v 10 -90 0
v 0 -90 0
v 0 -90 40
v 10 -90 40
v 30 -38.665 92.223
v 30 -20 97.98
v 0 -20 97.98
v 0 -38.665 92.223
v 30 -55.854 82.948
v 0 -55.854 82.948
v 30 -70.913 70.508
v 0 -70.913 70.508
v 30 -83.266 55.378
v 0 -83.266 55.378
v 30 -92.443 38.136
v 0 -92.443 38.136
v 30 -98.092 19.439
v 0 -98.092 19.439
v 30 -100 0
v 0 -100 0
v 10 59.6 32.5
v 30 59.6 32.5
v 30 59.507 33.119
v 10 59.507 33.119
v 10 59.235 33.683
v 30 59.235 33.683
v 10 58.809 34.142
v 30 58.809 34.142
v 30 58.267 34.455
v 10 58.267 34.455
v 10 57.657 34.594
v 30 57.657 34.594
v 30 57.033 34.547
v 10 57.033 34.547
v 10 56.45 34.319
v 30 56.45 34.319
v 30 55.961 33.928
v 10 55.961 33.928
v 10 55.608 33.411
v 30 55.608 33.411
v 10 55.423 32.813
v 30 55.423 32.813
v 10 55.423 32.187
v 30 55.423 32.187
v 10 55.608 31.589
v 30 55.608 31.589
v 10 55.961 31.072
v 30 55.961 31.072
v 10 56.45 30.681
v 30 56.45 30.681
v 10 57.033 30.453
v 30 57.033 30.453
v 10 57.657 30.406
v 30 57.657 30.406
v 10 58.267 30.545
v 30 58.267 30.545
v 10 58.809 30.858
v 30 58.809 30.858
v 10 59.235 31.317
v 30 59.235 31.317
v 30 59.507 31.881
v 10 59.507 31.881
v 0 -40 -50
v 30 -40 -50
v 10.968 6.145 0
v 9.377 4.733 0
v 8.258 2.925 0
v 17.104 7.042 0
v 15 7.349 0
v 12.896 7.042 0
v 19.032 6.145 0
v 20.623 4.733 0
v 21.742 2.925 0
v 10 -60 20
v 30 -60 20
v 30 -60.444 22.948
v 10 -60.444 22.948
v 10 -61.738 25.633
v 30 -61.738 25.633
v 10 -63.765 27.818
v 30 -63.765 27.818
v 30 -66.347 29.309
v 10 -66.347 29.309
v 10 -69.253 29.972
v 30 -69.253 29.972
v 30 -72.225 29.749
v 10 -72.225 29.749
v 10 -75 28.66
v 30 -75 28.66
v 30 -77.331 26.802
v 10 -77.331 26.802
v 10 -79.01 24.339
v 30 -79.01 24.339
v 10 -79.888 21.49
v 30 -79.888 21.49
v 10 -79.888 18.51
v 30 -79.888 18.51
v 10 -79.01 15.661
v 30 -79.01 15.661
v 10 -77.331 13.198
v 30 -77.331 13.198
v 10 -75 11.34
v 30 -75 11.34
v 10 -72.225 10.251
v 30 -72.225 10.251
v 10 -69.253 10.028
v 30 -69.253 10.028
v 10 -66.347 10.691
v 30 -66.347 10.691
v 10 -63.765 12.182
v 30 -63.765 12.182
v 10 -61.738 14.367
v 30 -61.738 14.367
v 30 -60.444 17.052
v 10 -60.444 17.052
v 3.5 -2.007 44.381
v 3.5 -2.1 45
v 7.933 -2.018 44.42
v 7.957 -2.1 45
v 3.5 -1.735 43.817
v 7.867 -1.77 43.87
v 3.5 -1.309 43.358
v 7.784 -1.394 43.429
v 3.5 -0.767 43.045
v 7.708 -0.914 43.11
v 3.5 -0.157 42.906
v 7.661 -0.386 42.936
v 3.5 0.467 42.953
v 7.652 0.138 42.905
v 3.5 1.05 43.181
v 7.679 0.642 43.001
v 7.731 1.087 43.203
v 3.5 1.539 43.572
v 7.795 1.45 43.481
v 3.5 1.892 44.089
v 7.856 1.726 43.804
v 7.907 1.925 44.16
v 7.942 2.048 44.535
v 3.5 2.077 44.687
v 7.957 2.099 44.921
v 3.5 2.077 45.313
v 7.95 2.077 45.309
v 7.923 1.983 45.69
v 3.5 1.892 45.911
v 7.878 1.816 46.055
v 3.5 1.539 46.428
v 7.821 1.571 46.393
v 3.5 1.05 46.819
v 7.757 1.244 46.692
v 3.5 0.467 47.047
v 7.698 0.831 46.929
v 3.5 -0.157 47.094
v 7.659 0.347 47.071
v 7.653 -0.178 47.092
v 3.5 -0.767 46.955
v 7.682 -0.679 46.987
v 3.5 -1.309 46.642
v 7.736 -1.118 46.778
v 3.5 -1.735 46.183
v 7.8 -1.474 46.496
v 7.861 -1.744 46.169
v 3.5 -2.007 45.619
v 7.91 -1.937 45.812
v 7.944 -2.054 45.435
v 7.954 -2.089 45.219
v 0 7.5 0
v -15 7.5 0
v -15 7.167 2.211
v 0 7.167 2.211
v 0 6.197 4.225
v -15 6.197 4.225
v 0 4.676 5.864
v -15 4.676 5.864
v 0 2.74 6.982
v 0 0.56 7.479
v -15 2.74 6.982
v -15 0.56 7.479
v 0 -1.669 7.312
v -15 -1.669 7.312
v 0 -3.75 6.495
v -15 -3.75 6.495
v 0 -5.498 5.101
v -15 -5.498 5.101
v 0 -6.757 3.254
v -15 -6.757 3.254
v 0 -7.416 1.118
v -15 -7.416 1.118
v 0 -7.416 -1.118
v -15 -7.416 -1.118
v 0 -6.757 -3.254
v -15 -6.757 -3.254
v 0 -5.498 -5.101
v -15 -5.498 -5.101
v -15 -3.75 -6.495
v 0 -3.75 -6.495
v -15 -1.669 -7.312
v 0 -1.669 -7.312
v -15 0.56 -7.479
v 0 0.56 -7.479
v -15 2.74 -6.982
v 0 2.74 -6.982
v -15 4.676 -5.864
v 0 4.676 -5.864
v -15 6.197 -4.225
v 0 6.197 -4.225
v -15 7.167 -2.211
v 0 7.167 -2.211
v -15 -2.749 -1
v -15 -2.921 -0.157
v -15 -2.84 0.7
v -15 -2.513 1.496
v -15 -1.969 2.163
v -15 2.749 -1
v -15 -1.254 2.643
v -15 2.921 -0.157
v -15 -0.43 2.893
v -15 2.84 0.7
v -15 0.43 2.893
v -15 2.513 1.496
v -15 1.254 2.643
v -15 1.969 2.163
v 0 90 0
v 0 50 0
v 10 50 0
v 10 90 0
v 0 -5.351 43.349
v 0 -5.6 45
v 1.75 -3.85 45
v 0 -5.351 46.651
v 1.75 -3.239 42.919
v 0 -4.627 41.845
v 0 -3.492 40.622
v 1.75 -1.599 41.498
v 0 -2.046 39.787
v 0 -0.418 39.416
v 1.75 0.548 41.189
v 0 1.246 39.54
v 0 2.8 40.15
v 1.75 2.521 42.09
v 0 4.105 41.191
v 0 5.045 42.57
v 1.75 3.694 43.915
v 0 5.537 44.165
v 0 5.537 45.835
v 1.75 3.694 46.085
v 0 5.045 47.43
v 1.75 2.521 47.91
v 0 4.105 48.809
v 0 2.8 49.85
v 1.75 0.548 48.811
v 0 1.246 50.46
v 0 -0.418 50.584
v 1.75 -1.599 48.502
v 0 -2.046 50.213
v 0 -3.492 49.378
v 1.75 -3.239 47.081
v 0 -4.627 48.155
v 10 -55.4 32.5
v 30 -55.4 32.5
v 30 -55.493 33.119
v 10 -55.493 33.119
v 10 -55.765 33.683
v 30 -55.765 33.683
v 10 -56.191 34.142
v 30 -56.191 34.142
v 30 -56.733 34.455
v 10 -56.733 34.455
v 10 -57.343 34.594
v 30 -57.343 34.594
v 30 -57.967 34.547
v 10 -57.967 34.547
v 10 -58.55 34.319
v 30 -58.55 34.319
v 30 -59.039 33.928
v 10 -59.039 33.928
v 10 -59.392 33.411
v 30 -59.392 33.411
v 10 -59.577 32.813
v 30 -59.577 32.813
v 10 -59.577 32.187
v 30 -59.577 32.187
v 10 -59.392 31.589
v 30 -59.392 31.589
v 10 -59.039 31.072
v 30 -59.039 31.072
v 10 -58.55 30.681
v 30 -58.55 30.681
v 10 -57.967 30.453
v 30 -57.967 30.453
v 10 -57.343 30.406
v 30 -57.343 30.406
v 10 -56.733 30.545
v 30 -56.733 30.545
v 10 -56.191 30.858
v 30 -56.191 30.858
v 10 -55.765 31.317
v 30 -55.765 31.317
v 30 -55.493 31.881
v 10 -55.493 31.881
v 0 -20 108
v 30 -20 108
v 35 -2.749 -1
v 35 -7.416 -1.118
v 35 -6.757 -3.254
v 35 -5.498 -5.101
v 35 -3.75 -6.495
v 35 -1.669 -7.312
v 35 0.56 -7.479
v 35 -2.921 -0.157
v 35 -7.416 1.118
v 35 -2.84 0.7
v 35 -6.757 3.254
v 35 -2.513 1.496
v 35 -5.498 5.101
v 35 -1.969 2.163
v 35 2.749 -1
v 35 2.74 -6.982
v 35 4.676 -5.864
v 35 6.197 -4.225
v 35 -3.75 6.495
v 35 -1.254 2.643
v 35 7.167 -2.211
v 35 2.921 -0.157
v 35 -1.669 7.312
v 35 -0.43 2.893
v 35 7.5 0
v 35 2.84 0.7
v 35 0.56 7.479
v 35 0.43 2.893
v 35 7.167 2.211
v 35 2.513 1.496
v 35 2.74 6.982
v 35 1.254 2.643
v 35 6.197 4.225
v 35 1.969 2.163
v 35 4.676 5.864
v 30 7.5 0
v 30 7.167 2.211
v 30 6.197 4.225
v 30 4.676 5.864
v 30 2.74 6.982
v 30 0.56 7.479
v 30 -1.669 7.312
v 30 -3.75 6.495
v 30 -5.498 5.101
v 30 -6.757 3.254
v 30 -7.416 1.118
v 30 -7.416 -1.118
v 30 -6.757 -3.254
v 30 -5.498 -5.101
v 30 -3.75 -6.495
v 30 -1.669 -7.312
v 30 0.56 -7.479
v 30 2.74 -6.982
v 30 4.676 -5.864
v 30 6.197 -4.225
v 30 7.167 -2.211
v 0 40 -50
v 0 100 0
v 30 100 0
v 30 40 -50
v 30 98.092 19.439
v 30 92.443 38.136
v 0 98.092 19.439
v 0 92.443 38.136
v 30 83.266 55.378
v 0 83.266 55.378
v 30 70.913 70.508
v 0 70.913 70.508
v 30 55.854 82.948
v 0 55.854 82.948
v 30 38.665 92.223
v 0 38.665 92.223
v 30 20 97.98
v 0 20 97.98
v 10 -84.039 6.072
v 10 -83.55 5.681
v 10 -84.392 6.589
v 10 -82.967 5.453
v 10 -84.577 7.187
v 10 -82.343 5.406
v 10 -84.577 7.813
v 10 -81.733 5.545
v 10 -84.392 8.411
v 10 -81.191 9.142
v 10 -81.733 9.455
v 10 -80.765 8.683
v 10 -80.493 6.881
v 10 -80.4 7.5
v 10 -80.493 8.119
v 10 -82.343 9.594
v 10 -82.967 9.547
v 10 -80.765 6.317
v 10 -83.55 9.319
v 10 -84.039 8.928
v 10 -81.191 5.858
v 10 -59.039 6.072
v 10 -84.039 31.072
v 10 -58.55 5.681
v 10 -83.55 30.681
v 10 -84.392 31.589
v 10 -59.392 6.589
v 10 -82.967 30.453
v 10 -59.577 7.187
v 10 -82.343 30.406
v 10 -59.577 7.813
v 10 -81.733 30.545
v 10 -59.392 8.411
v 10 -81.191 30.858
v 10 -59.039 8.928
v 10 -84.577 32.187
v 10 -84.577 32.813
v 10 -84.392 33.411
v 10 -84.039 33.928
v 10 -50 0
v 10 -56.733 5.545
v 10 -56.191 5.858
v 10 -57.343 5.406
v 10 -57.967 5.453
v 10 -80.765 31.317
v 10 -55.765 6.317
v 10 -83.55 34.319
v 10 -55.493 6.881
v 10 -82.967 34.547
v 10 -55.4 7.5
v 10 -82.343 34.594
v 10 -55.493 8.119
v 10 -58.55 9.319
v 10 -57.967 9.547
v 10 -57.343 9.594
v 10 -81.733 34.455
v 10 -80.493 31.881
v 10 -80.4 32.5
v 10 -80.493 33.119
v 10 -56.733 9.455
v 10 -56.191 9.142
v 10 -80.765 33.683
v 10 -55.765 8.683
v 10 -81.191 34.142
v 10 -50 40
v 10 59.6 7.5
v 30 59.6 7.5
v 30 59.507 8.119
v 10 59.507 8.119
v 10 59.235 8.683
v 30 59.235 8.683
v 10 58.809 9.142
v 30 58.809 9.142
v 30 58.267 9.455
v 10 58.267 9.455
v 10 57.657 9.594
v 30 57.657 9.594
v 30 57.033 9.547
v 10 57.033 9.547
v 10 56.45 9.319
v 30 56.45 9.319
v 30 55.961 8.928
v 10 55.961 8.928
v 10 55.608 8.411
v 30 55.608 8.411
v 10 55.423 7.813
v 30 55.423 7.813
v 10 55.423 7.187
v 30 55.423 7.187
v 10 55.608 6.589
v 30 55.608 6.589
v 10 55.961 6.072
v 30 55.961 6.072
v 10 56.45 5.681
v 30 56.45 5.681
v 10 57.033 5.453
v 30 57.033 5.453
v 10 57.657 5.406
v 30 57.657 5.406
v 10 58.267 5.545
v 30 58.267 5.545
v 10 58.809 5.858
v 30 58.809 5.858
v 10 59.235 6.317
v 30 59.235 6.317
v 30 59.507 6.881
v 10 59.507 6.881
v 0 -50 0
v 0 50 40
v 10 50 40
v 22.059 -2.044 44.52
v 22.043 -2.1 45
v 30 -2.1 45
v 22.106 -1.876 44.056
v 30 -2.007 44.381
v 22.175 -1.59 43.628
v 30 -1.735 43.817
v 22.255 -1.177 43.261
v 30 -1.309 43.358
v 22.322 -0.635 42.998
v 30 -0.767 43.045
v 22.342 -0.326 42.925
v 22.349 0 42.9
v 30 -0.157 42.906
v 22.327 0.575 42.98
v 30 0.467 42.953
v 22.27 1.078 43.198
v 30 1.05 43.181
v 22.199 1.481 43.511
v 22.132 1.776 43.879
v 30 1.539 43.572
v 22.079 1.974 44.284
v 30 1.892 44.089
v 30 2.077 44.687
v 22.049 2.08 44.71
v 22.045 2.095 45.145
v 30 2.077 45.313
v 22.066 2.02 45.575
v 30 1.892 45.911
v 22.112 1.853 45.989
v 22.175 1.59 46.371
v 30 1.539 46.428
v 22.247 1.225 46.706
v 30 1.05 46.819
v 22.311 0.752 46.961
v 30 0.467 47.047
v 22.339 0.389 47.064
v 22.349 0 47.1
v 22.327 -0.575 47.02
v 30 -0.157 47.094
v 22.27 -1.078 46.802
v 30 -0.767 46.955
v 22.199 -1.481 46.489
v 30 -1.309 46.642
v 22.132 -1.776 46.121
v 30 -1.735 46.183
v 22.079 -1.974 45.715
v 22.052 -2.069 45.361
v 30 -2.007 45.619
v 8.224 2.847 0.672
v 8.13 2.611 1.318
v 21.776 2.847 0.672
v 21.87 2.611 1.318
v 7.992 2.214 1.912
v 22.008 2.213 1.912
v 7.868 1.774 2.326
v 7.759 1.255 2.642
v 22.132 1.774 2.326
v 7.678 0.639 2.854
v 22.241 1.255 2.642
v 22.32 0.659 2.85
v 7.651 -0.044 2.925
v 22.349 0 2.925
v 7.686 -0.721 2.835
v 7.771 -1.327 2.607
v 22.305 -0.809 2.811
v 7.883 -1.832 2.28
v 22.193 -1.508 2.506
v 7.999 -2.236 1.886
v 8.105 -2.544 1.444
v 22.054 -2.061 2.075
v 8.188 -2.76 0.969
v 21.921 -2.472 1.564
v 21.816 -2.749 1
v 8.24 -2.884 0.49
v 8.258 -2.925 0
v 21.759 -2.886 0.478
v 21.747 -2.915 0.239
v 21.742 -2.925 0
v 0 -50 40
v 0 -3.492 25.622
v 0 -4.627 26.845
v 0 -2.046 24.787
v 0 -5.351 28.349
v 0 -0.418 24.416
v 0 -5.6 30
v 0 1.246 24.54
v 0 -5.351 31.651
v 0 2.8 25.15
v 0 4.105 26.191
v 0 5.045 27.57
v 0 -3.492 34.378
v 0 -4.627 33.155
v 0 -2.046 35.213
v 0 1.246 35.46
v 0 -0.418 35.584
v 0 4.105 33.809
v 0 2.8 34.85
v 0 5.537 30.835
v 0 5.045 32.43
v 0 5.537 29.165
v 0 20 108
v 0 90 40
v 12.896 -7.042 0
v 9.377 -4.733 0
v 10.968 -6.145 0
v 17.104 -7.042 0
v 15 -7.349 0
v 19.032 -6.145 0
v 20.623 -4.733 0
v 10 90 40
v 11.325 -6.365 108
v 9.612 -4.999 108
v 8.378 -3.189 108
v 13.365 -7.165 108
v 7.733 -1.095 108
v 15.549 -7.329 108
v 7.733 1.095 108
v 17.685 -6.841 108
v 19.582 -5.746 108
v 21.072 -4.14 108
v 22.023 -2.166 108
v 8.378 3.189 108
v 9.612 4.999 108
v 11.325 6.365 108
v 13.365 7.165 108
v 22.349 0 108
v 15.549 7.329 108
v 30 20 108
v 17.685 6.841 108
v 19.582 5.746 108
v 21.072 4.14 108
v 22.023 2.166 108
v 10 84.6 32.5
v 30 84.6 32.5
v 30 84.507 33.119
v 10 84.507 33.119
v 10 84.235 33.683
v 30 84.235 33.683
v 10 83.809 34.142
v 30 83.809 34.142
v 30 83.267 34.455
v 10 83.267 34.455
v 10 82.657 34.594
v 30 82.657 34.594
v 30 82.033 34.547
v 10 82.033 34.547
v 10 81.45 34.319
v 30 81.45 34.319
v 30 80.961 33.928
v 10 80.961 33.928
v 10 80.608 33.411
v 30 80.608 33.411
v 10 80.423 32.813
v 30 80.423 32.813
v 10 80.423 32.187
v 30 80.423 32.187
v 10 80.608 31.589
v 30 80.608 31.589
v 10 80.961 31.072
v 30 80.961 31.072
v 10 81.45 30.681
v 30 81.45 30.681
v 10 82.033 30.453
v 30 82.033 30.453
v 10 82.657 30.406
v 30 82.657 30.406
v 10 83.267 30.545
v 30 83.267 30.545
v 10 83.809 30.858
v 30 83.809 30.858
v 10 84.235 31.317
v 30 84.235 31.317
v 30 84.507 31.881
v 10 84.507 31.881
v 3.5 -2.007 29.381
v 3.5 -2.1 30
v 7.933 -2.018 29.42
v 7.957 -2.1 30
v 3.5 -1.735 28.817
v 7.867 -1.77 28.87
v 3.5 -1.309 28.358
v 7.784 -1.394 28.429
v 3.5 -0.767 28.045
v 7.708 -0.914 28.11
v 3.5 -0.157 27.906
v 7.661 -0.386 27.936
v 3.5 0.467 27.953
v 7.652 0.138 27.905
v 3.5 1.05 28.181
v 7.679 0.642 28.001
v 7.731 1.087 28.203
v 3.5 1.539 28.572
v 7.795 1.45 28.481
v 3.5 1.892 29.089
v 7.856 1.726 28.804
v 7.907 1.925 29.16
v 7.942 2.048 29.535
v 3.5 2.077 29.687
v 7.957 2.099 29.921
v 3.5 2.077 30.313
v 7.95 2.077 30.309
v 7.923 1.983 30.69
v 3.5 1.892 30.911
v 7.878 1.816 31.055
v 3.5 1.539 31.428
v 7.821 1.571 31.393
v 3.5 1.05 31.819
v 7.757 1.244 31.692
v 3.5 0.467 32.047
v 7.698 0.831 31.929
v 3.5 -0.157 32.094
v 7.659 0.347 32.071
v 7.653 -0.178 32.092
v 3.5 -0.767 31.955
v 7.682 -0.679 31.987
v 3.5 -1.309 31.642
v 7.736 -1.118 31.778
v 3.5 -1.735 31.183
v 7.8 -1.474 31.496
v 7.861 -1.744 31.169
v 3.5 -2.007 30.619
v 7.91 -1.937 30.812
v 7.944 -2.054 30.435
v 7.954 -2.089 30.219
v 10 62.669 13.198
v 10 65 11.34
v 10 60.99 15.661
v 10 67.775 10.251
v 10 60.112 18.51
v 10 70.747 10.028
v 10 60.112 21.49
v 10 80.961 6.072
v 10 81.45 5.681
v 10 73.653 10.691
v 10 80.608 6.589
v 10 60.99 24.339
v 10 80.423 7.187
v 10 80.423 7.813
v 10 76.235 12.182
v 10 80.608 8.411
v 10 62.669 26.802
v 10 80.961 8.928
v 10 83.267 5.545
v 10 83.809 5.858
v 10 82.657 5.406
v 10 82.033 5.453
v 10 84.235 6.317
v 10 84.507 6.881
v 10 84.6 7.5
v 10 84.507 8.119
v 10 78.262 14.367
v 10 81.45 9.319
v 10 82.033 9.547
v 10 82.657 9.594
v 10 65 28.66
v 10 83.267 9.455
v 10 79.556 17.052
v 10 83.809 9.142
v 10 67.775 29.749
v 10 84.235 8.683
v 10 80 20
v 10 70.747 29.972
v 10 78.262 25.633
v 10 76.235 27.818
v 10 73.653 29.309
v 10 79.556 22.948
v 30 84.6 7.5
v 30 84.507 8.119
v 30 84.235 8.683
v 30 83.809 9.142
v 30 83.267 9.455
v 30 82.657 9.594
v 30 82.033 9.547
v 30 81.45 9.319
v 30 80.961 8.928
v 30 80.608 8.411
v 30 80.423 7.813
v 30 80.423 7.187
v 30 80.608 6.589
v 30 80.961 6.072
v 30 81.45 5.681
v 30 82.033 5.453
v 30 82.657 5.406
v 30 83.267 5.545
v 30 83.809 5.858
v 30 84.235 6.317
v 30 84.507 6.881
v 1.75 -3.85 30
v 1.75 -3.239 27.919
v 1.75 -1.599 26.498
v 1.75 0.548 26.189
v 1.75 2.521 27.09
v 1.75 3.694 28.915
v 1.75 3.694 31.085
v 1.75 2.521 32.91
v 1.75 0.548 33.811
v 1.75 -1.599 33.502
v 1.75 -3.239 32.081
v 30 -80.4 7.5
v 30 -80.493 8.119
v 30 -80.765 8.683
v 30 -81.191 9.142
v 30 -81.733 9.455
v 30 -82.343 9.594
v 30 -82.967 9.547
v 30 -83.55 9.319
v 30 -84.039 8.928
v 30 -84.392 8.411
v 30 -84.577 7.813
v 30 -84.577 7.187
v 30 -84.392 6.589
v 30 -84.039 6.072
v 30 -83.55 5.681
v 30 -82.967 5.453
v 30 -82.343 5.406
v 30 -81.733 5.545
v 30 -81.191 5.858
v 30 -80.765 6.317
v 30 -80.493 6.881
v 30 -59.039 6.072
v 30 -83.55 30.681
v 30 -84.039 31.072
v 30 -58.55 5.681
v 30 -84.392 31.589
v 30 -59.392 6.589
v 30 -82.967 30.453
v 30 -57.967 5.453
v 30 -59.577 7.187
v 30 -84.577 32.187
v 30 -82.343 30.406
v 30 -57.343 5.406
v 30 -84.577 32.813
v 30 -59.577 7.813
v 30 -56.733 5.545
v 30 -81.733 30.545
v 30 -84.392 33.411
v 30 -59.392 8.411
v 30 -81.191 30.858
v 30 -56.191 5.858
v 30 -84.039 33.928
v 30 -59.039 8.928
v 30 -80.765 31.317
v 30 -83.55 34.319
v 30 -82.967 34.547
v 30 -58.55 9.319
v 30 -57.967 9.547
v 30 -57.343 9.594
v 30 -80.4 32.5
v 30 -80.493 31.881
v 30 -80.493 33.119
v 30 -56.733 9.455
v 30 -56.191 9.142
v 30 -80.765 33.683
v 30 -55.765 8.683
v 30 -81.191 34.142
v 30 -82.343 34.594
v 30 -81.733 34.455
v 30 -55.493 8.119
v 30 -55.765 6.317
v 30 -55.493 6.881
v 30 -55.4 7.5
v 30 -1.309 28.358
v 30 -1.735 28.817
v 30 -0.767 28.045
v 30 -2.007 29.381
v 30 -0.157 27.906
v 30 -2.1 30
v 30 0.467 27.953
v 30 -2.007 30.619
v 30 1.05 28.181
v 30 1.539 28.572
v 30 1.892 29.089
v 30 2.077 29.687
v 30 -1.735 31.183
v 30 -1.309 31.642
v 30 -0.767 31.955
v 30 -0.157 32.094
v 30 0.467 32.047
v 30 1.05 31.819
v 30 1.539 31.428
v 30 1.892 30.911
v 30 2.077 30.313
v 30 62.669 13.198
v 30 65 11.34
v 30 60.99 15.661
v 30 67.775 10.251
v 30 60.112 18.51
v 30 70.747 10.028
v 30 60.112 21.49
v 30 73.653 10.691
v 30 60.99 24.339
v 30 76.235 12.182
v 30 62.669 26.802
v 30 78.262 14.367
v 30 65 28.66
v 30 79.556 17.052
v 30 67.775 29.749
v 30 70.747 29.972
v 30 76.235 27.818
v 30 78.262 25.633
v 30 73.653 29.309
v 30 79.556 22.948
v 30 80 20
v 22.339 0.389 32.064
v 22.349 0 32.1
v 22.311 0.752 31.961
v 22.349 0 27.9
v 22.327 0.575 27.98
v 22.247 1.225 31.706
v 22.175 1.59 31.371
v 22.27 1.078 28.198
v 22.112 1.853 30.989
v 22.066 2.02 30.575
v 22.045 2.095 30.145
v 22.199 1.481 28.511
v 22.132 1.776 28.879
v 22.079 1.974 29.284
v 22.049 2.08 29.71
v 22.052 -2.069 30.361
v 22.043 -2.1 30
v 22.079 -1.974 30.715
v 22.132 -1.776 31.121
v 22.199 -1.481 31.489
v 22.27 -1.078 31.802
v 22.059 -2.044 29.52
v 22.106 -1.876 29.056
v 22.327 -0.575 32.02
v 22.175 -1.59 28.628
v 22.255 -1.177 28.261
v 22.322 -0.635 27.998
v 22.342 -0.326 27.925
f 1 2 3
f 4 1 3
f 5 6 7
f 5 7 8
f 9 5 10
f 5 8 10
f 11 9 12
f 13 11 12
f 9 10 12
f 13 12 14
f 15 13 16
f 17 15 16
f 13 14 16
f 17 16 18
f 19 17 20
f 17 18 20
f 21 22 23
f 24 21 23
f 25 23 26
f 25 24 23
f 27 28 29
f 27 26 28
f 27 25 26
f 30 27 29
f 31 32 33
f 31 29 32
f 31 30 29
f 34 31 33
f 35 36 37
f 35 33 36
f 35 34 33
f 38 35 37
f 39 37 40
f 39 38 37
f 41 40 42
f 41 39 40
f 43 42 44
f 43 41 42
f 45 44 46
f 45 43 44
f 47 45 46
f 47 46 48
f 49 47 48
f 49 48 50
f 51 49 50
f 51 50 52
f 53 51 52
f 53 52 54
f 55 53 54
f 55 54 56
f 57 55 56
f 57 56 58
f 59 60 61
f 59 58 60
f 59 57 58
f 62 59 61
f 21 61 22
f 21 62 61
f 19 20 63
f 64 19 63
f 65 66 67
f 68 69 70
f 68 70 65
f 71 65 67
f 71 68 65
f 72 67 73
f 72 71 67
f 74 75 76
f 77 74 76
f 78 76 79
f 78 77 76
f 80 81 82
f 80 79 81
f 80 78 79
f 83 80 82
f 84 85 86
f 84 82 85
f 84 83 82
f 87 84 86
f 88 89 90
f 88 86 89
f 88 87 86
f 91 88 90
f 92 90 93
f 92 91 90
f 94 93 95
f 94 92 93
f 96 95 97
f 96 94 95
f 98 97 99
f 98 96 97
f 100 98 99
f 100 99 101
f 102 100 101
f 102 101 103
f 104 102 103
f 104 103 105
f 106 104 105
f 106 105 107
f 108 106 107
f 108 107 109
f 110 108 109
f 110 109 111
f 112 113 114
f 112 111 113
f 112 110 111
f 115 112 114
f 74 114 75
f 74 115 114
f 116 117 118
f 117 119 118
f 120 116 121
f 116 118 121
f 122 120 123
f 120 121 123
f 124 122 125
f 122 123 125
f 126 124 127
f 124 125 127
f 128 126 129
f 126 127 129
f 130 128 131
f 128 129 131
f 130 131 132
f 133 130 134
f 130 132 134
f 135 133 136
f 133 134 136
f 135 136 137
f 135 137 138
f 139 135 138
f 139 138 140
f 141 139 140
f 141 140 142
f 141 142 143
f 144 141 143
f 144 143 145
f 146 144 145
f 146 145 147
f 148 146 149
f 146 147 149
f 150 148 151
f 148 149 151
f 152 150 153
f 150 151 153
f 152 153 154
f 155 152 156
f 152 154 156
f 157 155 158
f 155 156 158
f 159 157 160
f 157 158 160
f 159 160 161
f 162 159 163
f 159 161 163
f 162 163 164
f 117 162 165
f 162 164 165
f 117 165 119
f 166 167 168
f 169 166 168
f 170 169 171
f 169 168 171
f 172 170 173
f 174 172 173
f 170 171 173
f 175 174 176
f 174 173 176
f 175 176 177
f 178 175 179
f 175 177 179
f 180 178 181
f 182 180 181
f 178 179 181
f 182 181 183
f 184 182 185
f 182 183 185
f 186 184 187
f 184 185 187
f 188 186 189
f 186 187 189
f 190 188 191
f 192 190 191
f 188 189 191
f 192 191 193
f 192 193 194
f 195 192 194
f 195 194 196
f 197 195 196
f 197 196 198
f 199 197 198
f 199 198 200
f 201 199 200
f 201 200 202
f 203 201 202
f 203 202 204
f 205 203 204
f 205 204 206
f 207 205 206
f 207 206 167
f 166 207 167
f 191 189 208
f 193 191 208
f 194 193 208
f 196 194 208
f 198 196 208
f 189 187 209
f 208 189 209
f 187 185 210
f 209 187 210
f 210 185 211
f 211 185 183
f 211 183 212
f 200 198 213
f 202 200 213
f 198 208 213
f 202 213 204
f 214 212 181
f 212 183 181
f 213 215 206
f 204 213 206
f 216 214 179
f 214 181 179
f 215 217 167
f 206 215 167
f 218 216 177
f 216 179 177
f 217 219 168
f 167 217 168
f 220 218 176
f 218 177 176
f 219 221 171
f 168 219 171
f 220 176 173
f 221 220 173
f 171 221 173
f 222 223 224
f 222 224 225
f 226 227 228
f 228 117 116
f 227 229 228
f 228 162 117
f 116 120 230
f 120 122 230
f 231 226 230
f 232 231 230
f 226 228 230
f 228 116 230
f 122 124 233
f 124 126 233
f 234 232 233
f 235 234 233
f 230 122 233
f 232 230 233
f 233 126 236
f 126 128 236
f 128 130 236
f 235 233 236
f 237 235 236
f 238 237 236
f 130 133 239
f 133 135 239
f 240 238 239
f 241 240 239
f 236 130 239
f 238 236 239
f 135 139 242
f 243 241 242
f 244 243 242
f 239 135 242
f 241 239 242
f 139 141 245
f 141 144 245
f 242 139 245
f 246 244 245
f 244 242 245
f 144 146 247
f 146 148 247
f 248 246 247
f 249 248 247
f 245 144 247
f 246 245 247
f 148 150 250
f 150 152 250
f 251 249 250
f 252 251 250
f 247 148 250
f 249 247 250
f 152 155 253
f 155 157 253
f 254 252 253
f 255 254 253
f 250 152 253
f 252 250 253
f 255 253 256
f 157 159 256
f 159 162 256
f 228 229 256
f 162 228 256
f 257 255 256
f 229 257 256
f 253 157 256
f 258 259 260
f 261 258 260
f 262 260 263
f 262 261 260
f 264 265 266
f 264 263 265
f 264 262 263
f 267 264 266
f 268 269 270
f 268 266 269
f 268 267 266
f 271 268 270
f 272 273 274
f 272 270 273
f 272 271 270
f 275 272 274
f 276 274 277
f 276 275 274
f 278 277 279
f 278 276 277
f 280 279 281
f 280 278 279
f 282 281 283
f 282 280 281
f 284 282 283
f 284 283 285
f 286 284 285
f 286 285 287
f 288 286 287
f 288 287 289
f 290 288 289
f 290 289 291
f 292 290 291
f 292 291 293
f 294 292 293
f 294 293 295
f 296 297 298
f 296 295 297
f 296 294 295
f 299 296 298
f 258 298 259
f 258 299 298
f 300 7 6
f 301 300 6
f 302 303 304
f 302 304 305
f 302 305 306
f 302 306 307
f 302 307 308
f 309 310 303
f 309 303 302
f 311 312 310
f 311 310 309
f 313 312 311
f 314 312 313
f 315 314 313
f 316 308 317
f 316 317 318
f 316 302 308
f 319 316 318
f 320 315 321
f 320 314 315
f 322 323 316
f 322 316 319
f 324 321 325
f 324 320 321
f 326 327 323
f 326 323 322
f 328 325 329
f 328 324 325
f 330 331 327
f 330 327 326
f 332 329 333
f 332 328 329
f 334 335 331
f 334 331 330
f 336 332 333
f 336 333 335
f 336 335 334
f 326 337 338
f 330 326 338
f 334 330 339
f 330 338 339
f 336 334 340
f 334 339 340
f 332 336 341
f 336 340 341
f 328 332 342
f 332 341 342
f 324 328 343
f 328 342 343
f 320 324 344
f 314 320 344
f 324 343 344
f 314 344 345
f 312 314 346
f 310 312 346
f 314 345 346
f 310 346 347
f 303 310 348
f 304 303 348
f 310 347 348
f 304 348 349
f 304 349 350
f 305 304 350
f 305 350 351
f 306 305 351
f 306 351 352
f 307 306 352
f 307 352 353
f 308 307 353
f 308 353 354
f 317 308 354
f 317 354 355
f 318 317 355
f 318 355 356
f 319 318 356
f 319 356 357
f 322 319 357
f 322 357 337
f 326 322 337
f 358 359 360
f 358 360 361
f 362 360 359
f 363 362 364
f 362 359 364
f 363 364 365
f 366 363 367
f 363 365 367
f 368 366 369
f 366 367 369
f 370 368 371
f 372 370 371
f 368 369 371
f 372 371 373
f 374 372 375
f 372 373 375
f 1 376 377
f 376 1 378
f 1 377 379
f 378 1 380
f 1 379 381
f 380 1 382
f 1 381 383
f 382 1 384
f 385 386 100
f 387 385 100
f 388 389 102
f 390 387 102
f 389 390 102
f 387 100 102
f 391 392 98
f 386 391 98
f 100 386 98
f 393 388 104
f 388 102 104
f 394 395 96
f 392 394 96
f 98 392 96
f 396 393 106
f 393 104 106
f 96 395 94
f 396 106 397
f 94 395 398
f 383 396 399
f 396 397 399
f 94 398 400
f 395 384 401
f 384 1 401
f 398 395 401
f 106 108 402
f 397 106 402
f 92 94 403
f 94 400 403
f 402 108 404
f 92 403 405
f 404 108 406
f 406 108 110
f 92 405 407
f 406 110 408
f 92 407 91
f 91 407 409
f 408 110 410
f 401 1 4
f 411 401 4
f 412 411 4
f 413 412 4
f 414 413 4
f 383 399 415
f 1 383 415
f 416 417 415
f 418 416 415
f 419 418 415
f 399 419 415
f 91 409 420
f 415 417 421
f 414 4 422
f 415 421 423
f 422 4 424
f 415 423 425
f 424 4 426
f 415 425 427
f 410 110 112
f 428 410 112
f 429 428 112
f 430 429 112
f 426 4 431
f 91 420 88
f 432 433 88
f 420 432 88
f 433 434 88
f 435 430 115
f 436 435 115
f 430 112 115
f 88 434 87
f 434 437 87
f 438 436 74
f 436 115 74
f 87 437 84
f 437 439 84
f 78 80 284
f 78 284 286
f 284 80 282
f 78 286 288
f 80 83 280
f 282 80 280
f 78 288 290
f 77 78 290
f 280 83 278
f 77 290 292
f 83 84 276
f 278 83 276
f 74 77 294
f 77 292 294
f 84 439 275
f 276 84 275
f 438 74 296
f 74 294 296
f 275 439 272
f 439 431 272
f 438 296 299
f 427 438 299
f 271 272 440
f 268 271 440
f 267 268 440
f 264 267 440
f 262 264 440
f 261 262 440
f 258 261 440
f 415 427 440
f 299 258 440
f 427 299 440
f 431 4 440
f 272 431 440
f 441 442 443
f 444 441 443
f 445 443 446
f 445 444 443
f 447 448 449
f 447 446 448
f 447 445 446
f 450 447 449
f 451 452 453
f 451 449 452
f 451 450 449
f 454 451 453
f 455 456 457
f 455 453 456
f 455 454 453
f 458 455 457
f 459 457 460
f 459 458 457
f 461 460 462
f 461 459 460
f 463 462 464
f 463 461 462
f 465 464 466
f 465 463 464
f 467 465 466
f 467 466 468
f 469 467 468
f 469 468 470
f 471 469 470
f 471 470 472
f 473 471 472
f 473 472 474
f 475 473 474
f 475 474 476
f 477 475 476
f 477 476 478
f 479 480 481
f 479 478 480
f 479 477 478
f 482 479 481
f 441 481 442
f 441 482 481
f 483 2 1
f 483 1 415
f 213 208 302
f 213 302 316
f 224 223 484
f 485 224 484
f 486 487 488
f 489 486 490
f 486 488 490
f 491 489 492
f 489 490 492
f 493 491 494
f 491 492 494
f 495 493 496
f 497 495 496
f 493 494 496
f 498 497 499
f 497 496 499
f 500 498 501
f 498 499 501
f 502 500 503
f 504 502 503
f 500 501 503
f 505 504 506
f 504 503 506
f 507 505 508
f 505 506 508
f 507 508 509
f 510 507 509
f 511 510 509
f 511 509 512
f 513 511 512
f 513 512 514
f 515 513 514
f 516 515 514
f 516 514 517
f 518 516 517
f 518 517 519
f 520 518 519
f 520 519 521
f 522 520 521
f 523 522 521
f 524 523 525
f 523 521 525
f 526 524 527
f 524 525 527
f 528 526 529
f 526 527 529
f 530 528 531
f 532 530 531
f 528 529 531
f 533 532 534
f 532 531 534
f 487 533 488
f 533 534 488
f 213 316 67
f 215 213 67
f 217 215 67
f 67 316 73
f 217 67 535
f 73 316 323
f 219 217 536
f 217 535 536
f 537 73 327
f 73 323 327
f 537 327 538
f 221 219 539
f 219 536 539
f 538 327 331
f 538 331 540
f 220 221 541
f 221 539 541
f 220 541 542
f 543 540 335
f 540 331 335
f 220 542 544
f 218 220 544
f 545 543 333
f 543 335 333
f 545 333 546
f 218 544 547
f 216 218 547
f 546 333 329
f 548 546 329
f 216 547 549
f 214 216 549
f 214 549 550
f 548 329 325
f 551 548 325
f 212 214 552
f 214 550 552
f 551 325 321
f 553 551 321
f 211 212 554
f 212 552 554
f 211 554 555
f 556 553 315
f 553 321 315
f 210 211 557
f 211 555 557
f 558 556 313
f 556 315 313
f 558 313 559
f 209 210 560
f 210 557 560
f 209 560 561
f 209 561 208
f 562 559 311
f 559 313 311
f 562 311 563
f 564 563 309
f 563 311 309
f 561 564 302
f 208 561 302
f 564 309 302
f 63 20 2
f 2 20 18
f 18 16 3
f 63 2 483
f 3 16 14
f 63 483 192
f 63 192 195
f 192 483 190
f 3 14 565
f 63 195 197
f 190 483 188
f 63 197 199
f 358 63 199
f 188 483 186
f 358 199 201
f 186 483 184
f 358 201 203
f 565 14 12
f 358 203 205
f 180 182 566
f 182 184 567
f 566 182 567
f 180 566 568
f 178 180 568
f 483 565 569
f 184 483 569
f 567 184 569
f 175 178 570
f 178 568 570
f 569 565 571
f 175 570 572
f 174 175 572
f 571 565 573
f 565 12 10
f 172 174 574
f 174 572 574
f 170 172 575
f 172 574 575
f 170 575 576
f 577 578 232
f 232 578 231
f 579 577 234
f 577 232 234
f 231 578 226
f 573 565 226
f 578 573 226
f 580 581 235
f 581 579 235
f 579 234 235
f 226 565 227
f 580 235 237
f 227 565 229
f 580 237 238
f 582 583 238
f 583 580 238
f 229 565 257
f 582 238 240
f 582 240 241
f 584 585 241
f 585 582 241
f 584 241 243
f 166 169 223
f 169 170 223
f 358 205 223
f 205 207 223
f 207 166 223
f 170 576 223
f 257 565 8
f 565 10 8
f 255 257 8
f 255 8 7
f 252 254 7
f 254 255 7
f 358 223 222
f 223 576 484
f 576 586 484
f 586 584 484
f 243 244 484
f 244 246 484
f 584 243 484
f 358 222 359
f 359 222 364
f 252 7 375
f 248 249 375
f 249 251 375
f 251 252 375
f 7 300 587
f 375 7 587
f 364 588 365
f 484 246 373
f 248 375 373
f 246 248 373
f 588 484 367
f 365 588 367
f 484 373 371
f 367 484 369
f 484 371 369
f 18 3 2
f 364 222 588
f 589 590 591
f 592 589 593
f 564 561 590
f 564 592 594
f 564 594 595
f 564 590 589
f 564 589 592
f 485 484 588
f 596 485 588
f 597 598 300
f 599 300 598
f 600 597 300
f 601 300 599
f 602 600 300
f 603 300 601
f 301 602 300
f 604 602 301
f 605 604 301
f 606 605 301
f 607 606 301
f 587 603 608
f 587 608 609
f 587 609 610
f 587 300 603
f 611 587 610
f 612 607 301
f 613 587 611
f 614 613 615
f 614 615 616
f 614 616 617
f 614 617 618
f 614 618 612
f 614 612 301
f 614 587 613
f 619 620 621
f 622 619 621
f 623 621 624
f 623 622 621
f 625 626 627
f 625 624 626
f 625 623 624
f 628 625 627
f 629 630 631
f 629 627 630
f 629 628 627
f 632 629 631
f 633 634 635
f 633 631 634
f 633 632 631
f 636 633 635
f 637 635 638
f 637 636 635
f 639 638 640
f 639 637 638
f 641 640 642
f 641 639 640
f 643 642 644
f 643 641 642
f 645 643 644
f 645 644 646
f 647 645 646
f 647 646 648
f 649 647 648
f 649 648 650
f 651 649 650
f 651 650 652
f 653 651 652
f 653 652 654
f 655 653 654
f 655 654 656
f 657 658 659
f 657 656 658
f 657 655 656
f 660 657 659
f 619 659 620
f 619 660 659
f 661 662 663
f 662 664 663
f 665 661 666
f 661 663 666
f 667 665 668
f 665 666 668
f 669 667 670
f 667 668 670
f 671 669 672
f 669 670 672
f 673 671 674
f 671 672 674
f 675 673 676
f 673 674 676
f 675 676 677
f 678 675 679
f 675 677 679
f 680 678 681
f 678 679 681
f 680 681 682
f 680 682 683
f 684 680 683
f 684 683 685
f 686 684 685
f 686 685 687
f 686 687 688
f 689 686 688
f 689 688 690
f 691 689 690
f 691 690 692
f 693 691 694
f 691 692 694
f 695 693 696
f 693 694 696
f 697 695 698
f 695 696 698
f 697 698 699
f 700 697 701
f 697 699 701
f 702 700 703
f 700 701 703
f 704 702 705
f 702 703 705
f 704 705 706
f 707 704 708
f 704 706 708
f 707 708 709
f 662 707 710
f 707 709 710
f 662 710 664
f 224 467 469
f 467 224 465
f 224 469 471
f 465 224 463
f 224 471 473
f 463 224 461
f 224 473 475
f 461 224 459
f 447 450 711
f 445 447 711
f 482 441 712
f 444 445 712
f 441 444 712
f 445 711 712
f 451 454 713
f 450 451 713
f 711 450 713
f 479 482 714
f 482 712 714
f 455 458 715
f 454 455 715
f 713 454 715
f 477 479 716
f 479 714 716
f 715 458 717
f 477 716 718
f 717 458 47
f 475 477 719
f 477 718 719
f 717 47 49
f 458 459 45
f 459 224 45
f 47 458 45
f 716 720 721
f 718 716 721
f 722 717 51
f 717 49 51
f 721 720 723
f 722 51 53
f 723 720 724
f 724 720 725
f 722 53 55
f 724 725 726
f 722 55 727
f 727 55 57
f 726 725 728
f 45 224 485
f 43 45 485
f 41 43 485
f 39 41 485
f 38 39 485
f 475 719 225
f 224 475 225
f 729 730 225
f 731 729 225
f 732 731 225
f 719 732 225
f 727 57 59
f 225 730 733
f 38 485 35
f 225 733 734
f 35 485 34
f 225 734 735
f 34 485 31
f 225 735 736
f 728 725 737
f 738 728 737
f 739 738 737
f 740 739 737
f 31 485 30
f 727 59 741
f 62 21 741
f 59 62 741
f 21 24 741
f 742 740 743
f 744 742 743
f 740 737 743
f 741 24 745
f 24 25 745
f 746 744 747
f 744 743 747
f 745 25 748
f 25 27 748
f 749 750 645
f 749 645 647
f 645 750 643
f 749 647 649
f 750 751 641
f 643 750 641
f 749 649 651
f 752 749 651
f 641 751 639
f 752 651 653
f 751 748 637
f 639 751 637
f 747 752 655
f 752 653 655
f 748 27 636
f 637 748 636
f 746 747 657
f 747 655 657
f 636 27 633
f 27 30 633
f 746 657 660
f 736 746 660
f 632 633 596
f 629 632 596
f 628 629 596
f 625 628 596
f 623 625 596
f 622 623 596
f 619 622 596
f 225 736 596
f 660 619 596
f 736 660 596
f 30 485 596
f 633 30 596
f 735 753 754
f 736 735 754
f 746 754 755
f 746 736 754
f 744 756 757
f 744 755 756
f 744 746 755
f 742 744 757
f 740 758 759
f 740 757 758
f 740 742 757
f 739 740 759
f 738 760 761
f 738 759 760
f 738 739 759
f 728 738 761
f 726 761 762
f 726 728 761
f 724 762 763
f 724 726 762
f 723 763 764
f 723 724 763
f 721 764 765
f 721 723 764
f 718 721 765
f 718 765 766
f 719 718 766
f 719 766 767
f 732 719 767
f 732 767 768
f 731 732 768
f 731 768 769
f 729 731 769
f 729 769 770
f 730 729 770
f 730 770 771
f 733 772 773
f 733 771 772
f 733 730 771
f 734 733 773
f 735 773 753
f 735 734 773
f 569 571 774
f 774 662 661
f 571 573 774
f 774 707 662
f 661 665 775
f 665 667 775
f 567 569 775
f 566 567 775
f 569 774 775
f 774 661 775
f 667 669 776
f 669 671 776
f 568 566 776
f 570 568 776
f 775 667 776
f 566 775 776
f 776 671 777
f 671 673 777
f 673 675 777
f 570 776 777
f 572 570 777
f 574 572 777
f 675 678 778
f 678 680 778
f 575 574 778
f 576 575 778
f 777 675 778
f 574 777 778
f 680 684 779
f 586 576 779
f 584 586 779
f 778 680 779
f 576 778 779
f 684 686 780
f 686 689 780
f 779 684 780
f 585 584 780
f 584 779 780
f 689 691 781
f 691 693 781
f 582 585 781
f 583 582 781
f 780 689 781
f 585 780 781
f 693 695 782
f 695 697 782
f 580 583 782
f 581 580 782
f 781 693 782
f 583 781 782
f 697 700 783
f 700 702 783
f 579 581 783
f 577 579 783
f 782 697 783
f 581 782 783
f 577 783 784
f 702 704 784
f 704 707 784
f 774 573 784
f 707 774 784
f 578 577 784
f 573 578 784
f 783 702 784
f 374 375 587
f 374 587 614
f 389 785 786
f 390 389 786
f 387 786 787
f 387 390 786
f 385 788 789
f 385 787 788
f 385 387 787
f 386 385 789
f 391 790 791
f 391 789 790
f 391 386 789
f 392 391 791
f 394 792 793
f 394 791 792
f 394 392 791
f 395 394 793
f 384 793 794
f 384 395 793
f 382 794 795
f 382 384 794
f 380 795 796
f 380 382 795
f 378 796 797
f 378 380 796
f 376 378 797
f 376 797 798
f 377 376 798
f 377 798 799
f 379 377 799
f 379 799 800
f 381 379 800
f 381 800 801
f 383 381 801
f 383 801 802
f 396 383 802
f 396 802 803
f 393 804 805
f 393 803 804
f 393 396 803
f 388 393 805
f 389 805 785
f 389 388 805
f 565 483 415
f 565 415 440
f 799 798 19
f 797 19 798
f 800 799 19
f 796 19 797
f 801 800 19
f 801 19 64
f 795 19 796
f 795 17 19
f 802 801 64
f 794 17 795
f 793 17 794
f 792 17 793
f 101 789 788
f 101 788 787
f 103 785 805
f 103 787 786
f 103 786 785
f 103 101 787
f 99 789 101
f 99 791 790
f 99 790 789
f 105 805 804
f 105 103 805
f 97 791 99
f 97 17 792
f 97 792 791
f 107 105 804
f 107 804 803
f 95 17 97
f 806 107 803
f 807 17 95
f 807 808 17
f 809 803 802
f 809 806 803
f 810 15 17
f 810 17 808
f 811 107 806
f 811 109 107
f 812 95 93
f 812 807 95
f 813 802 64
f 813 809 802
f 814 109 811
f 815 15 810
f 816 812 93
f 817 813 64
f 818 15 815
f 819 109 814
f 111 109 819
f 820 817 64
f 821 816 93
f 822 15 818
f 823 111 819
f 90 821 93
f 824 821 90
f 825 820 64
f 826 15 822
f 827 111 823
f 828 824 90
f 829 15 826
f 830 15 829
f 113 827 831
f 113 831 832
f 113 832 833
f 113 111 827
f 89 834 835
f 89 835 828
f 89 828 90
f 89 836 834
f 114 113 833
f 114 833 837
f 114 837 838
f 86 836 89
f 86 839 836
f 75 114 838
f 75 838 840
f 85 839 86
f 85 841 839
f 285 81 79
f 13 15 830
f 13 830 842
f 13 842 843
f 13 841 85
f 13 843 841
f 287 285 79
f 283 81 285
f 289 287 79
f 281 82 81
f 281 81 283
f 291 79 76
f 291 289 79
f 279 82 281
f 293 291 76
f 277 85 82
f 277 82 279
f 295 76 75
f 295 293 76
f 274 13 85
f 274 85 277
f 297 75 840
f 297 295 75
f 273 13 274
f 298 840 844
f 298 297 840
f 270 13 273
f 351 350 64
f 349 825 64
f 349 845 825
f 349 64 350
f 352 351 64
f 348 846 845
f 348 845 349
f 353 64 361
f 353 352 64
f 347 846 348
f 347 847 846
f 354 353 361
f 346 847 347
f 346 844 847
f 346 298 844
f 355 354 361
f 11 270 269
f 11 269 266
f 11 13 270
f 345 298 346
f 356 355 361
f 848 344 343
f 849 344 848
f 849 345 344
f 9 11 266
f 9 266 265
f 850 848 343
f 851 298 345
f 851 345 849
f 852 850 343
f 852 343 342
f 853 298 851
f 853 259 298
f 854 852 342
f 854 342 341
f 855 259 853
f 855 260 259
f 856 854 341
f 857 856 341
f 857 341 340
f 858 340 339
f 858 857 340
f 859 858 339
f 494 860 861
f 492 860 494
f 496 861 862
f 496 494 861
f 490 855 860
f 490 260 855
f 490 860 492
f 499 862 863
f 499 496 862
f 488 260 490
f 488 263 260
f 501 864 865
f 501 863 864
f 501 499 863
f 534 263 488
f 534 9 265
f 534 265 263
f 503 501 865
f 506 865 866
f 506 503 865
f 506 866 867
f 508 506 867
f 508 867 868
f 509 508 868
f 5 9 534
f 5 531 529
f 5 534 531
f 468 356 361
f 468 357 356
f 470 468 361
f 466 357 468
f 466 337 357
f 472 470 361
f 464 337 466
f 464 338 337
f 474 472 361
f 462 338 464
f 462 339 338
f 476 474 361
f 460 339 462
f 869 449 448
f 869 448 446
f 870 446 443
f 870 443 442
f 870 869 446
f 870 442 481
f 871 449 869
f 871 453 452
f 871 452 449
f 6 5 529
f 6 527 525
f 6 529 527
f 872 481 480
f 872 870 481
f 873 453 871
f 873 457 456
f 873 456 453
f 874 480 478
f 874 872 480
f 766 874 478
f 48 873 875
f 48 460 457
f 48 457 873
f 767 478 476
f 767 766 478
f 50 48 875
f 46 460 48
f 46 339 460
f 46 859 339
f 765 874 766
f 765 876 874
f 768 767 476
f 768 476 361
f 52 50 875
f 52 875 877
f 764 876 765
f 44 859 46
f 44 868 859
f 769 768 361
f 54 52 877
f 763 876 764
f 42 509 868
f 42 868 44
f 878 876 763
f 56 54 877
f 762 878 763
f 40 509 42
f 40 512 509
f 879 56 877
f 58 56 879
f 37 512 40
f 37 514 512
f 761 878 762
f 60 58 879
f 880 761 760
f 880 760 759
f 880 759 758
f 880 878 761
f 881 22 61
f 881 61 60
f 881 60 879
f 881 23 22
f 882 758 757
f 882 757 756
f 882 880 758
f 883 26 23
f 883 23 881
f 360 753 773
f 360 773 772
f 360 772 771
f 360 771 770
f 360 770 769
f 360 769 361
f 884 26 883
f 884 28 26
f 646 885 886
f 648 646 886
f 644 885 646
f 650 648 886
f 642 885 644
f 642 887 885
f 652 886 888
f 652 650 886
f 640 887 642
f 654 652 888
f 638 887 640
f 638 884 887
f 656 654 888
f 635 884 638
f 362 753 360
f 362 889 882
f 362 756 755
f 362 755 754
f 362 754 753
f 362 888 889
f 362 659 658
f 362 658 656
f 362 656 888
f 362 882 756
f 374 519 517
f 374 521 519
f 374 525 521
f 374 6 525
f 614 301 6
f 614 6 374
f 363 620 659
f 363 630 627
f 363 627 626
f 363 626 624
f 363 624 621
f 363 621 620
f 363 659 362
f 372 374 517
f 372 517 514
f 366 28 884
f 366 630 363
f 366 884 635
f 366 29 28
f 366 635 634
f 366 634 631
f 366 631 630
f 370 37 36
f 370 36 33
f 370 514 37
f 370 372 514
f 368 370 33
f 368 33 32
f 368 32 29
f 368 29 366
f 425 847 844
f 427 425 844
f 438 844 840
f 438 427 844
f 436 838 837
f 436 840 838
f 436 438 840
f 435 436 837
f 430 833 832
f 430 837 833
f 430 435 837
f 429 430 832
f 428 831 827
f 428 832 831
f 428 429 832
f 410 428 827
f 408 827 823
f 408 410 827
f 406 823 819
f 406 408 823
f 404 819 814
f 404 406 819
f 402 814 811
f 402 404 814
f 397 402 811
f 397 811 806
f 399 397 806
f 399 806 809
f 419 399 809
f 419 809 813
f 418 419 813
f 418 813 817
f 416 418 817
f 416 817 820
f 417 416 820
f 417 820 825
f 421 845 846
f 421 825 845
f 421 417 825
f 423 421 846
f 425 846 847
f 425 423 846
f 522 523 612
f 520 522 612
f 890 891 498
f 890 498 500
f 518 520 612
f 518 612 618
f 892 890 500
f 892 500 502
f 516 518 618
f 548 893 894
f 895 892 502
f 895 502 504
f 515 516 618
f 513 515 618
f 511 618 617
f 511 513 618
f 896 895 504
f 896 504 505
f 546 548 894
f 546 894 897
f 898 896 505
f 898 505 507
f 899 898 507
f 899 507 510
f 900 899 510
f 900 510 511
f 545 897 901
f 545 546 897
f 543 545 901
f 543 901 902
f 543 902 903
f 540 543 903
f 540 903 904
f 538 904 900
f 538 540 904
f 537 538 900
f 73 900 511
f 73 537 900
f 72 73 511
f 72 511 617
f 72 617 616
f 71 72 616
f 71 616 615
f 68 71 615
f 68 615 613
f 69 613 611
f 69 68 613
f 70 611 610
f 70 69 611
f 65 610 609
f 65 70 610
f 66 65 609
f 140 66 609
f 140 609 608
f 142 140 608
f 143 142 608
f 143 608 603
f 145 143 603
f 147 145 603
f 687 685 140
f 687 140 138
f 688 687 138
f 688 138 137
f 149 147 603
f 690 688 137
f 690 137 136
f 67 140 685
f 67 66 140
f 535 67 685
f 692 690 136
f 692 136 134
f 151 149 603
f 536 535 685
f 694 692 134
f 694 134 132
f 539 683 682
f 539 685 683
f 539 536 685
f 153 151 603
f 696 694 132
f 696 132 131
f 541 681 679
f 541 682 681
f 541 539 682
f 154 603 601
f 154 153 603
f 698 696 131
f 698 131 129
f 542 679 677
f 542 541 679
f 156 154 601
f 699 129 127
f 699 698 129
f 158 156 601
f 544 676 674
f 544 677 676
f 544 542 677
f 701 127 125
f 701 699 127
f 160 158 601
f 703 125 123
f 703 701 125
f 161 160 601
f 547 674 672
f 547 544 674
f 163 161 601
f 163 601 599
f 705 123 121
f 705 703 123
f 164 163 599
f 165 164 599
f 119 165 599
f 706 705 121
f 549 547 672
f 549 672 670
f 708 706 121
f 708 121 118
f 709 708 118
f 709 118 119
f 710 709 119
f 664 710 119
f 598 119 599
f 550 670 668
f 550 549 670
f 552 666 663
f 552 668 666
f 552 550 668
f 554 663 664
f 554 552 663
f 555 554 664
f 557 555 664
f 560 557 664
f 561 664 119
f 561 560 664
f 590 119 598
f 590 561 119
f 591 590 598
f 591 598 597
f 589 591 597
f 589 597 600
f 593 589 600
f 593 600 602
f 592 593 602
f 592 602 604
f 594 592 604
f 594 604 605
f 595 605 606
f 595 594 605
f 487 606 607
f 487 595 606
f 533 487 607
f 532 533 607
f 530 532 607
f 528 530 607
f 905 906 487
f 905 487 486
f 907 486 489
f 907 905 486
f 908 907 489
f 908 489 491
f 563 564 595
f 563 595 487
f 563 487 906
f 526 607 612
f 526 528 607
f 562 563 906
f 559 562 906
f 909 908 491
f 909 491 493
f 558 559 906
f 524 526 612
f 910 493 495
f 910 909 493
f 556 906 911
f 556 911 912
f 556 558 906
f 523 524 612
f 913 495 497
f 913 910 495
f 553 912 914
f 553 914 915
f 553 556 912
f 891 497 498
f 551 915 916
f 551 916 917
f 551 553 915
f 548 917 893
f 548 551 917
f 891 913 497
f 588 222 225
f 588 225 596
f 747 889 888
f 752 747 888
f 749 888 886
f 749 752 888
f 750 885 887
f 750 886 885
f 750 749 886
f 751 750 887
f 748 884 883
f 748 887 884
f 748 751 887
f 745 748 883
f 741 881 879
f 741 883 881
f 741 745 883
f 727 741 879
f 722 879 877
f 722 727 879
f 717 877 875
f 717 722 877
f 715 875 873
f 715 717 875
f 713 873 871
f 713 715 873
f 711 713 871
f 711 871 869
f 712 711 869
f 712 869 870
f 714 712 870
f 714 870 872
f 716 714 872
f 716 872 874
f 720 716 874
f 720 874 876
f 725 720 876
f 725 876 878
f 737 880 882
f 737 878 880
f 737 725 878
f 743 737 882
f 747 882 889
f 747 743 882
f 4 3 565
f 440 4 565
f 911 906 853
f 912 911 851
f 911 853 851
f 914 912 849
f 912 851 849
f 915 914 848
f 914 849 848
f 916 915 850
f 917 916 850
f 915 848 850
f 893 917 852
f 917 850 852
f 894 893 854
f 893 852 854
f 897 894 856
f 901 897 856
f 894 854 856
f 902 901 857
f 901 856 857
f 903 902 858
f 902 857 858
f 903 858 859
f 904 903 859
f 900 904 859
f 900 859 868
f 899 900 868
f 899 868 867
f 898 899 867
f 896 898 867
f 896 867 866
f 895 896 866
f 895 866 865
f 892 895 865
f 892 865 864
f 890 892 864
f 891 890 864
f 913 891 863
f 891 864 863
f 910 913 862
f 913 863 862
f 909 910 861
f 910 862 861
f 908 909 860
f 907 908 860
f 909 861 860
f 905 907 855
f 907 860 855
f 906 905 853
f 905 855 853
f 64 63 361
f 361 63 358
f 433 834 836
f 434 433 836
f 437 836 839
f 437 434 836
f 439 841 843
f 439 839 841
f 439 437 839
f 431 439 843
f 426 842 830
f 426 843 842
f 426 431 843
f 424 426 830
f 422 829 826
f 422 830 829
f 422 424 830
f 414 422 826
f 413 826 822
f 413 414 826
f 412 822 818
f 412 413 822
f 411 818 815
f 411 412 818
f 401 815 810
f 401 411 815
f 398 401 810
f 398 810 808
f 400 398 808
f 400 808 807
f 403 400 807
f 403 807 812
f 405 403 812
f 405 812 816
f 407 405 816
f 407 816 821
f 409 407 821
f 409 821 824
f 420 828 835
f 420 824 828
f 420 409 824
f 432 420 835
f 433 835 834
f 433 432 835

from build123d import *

# Parameters (mm, degrees)
PAD_DEPTH           = 30
SKETCH007_R         = 7.5
PAD006_DEPTH        = 50
SKETCH009_W         = 30
SKETCH009_H         = 40
PAD007_DEPTH        = 108
SKETCH008_R         = 7.349434
POCKET_DEPTH        = 114
HOLE001_D           = 4.2
HOLE001_DEPTH       = 62
HOLE001_CSINK_D     = 11.2
HOLE001_CSINK_ANGLE = 90
SKETCH012_R         = 10
POCKET001_DEPTH     = 42
SKETCH016_W         = 40
SKETCH016_H         = 40
POCKET004_DEPTH     = 10
SKETCH017_R         = 2.1
HOLE002_DEPTH       = 36
POCKET007_DEPTH     = 71


with BuildPart() as part:
    # Sketch → Pad (new body)
    with BuildSketch(Plane.YZ):
        with BuildLine():
            ThreePointArc((100, 0), (-1.8e-05, 100), (-100, -3.5e-05))
            Line((-100, -3.5e-05), (-40, -50))
            Line((-40, -50), (40, -50))
            Line((100, 0), (40, -50))
        make_face()
    extrude(amount=PAD_DEPTH)

    # Sketch007 → Pad006 (join)
    with BuildSketch(Plane.YZ.offset(-15)):
        Circle(SKETCH007_R)
    extrude(amount=PAD006_DEPTH)

    # Sketch009 → Pad007 (join)
    with BuildSketch(Plane.XY):
        with Locations((15, 0)):
            Rectangle(SKETCH009_W, SKETCH009_H)
    extrude(amount=PAD007_DEPTH)

    # Sketch008 → Pocket (cut)
    with BuildSketch(Plane.XY):
        with Locations((15, 0)):
            Circle(SKETCH008_R)
    extrude(amount=POCKET_DEPTH, mode=Mode.SUBTRACT)

    # Hole001
    with Locations(Plane(origin=(0, 0, 0), x_dir=(0, 1, 0), z_dir=(-1, 0, 0))):
        with Locations((0, -45), (0, -30)):
            CounterSinkHole(HOLE001_D / 2, HOLE001_CSINK_D / 2, depth=HOLE001_DEPTH, counter_sink_angle=HOLE001_CSINK_ANGLE)

    # Sketch012 → Pocket001 (cut)
    with BuildSketch(Plane.YZ):
        with Locations((-70, 20)):
            Circle(SKETCH012_R)
        with Locations((70, 20)):
            Circle(SKETCH012_R)
    extrude(amount=POCKET001_DEPTH, mode=Mode.SUBTRACT)

    # Sketch016 → Pocket004 (cut)
    with BuildSketch(Plane.YZ):
        with Locations((-70, 20)):
            Rectangle(SKETCH016_W, SKETCH016_H)
        with Locations((70, 20)):
            Rectangle(SKETCH016_W, SKETCH016_H)
    extrude(amount=POCKET004_DEPTH, mode=Mode.SUBTRACT)

    # Sketch017 → Hole002 (cut)
    with BuildSketch(Plane.YZ):
        with Locations((-82.5, 32.5)):
            Circle(SKETCH017_R)
        with Locations((-57.5, 32.5)):
            Circle(SKETCH017_R)
        with Locations((-82.5, 7.5)):
            Circle(SKETCH017_R)
        with Locations((-57.5, 7.5)):
            Circle(SKETCH017_R)
        with Locations((57.5, 32.5)):
            Circle(SKETCH017_R)
        with Locations((82.5, 32.5)):
            Circle(SKETCH017_R)
        with Locations((57.5, 7.5)):
            Circle(SKETCH017_R)
        with Locations((82.5, 7.5)):
            Circle(SKETCH017_R)
    extrude(amount=HOLE002_DEPTH, mode=Mode.SUBTRACT)

    # Sketch031 → Pocket007 (cut)
    with BuildSketch(Plane.YZ.offset(40)):
        with BuildLine():
            ThreePointArc((2.748601, -1.00041), (0, 2.924999), (-2.748601, -1.00041))
            Line((-2.748601, -1.00041), (2.748601, -1.00041))
        make_face()
    extrude(amount=-POCKET007_DEPTH, mode=Mode.SUBTRACT)


solid = part.part
